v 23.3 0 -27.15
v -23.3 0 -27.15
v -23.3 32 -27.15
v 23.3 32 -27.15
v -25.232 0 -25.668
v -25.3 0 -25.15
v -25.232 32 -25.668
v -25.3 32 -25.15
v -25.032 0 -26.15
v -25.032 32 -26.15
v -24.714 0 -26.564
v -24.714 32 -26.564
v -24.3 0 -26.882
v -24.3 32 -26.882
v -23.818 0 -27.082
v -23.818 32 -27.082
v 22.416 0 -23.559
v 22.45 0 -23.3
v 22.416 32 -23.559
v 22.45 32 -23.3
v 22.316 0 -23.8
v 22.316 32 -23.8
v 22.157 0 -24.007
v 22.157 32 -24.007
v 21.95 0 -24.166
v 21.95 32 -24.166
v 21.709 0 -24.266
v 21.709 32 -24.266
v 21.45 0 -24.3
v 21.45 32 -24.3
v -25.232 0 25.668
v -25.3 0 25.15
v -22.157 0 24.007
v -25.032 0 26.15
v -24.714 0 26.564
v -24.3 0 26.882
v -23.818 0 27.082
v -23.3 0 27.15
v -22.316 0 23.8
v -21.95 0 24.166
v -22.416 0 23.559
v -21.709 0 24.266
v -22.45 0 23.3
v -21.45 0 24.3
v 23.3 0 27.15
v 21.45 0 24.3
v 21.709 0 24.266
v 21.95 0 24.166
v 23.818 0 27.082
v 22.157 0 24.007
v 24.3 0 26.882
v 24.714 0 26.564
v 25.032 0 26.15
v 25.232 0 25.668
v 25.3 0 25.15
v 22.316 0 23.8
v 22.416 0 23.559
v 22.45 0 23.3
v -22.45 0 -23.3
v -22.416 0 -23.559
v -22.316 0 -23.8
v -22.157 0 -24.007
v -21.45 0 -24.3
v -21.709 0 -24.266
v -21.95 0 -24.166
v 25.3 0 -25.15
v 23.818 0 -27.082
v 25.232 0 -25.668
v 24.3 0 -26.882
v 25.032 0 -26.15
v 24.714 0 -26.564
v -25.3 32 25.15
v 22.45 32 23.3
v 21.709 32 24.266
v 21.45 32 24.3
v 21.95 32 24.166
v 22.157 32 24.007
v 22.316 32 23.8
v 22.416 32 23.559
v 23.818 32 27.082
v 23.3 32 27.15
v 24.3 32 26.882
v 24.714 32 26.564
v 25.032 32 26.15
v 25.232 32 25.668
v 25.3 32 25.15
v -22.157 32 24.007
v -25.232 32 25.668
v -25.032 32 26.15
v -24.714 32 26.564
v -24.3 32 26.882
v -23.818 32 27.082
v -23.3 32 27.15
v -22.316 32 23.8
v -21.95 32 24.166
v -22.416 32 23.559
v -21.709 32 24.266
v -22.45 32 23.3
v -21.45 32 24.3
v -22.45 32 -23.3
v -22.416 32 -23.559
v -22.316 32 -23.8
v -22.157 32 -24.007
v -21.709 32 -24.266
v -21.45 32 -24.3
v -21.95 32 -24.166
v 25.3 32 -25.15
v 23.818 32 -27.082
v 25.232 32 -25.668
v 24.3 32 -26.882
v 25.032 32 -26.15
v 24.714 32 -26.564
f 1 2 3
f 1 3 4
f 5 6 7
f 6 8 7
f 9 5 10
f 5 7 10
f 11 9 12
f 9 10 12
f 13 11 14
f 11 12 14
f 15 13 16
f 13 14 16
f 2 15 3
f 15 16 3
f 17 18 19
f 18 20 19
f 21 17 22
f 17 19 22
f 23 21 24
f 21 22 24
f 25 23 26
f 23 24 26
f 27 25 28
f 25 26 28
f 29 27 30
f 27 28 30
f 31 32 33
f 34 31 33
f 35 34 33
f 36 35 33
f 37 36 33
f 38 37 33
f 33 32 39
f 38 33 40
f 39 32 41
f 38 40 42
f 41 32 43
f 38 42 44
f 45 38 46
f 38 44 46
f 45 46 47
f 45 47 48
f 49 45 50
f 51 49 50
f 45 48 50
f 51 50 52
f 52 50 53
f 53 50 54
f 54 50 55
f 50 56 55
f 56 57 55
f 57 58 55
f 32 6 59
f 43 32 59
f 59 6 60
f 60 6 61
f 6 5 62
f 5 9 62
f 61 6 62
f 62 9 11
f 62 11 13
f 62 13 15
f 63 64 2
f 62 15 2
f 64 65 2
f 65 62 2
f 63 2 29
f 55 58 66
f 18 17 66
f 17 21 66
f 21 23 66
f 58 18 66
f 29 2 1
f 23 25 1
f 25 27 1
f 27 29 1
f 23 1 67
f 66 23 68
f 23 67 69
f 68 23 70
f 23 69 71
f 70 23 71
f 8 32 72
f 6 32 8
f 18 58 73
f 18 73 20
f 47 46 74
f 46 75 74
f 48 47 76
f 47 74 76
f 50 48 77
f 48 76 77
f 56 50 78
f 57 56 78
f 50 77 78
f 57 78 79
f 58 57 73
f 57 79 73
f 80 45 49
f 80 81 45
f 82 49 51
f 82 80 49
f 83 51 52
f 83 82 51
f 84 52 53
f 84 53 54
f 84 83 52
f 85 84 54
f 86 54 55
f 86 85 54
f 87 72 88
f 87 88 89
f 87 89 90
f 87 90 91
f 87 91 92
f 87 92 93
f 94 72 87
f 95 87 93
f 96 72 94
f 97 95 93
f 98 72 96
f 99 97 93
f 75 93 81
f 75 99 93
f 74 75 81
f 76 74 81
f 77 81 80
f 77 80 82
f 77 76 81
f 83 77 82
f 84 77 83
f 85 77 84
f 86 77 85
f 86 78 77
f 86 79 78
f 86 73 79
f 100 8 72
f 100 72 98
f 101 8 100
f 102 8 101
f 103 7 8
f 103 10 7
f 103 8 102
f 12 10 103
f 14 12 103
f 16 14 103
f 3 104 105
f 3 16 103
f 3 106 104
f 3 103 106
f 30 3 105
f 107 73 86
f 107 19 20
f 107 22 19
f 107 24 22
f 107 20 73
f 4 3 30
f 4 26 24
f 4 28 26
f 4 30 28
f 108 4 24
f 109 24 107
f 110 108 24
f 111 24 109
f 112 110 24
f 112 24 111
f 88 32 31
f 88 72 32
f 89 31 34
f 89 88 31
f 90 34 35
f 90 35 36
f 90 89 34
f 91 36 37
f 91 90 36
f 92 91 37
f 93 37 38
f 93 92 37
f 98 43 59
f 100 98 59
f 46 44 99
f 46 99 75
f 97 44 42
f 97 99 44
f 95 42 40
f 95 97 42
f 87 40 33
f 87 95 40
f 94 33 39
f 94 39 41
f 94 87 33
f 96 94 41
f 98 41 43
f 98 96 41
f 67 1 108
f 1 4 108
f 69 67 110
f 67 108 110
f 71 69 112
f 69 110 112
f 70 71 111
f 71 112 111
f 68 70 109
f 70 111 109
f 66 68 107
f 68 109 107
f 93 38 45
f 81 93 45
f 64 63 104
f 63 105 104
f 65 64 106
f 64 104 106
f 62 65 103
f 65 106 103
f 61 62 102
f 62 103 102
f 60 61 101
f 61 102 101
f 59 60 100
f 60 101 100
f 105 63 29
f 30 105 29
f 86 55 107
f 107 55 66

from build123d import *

# Parameters (mm, degrees)
SKETCH3_W           = 50.6
SKETCH3_H           = 54.3
SKETCH3_W_2         = 44.9
SKETCH3_H_2         = 48.6
BOSS_EXTRUDE1_DEPTH = 32
FILLET1_R           = 2
FILLET2_R           = 1


with BuildPart() as part:
    # Sketch3 → Boss-Extrude1 (new body)
    with BuildSketch(Plane(origin=(0, 0, 0), x_dir=(1, 0, 0), z_dir=(0, 1, 0))):
        Rectangle(SKETCH3_W, SKETCH3_H)
        Rectangle(SKETCH3_W_2, SKETCH3_H_2, mode=Mode.SUBTRACT)
    extrude(amount=BOSS_EXTRUDE1_DEPTH)

    # Fillet1
    fillet1_edges = [part.edges().sort_by_distance(p)[0] for p in [
        (25.3, 16, 27.15),
        (-25.3, 16, 27.15),
        (-25.3, 16, -27.15),
        (25.3, 16, -27.15),
    ]]
    fillet(fillet1_edges, radius=FILLET1_R)

    # Fillet2
    fillet2_edges = [part.edges().sort_by_distance(p)[0] for p in [
        (22.45, 16, 24.3),
        (22.45, 16, -24.3),
        (-22.45, 16, -24.3),
        (-22.45, 16, 24.3),
    ]]
    fillet(fillet2_edges, radius=FILLET2_R)


solid = part.part
